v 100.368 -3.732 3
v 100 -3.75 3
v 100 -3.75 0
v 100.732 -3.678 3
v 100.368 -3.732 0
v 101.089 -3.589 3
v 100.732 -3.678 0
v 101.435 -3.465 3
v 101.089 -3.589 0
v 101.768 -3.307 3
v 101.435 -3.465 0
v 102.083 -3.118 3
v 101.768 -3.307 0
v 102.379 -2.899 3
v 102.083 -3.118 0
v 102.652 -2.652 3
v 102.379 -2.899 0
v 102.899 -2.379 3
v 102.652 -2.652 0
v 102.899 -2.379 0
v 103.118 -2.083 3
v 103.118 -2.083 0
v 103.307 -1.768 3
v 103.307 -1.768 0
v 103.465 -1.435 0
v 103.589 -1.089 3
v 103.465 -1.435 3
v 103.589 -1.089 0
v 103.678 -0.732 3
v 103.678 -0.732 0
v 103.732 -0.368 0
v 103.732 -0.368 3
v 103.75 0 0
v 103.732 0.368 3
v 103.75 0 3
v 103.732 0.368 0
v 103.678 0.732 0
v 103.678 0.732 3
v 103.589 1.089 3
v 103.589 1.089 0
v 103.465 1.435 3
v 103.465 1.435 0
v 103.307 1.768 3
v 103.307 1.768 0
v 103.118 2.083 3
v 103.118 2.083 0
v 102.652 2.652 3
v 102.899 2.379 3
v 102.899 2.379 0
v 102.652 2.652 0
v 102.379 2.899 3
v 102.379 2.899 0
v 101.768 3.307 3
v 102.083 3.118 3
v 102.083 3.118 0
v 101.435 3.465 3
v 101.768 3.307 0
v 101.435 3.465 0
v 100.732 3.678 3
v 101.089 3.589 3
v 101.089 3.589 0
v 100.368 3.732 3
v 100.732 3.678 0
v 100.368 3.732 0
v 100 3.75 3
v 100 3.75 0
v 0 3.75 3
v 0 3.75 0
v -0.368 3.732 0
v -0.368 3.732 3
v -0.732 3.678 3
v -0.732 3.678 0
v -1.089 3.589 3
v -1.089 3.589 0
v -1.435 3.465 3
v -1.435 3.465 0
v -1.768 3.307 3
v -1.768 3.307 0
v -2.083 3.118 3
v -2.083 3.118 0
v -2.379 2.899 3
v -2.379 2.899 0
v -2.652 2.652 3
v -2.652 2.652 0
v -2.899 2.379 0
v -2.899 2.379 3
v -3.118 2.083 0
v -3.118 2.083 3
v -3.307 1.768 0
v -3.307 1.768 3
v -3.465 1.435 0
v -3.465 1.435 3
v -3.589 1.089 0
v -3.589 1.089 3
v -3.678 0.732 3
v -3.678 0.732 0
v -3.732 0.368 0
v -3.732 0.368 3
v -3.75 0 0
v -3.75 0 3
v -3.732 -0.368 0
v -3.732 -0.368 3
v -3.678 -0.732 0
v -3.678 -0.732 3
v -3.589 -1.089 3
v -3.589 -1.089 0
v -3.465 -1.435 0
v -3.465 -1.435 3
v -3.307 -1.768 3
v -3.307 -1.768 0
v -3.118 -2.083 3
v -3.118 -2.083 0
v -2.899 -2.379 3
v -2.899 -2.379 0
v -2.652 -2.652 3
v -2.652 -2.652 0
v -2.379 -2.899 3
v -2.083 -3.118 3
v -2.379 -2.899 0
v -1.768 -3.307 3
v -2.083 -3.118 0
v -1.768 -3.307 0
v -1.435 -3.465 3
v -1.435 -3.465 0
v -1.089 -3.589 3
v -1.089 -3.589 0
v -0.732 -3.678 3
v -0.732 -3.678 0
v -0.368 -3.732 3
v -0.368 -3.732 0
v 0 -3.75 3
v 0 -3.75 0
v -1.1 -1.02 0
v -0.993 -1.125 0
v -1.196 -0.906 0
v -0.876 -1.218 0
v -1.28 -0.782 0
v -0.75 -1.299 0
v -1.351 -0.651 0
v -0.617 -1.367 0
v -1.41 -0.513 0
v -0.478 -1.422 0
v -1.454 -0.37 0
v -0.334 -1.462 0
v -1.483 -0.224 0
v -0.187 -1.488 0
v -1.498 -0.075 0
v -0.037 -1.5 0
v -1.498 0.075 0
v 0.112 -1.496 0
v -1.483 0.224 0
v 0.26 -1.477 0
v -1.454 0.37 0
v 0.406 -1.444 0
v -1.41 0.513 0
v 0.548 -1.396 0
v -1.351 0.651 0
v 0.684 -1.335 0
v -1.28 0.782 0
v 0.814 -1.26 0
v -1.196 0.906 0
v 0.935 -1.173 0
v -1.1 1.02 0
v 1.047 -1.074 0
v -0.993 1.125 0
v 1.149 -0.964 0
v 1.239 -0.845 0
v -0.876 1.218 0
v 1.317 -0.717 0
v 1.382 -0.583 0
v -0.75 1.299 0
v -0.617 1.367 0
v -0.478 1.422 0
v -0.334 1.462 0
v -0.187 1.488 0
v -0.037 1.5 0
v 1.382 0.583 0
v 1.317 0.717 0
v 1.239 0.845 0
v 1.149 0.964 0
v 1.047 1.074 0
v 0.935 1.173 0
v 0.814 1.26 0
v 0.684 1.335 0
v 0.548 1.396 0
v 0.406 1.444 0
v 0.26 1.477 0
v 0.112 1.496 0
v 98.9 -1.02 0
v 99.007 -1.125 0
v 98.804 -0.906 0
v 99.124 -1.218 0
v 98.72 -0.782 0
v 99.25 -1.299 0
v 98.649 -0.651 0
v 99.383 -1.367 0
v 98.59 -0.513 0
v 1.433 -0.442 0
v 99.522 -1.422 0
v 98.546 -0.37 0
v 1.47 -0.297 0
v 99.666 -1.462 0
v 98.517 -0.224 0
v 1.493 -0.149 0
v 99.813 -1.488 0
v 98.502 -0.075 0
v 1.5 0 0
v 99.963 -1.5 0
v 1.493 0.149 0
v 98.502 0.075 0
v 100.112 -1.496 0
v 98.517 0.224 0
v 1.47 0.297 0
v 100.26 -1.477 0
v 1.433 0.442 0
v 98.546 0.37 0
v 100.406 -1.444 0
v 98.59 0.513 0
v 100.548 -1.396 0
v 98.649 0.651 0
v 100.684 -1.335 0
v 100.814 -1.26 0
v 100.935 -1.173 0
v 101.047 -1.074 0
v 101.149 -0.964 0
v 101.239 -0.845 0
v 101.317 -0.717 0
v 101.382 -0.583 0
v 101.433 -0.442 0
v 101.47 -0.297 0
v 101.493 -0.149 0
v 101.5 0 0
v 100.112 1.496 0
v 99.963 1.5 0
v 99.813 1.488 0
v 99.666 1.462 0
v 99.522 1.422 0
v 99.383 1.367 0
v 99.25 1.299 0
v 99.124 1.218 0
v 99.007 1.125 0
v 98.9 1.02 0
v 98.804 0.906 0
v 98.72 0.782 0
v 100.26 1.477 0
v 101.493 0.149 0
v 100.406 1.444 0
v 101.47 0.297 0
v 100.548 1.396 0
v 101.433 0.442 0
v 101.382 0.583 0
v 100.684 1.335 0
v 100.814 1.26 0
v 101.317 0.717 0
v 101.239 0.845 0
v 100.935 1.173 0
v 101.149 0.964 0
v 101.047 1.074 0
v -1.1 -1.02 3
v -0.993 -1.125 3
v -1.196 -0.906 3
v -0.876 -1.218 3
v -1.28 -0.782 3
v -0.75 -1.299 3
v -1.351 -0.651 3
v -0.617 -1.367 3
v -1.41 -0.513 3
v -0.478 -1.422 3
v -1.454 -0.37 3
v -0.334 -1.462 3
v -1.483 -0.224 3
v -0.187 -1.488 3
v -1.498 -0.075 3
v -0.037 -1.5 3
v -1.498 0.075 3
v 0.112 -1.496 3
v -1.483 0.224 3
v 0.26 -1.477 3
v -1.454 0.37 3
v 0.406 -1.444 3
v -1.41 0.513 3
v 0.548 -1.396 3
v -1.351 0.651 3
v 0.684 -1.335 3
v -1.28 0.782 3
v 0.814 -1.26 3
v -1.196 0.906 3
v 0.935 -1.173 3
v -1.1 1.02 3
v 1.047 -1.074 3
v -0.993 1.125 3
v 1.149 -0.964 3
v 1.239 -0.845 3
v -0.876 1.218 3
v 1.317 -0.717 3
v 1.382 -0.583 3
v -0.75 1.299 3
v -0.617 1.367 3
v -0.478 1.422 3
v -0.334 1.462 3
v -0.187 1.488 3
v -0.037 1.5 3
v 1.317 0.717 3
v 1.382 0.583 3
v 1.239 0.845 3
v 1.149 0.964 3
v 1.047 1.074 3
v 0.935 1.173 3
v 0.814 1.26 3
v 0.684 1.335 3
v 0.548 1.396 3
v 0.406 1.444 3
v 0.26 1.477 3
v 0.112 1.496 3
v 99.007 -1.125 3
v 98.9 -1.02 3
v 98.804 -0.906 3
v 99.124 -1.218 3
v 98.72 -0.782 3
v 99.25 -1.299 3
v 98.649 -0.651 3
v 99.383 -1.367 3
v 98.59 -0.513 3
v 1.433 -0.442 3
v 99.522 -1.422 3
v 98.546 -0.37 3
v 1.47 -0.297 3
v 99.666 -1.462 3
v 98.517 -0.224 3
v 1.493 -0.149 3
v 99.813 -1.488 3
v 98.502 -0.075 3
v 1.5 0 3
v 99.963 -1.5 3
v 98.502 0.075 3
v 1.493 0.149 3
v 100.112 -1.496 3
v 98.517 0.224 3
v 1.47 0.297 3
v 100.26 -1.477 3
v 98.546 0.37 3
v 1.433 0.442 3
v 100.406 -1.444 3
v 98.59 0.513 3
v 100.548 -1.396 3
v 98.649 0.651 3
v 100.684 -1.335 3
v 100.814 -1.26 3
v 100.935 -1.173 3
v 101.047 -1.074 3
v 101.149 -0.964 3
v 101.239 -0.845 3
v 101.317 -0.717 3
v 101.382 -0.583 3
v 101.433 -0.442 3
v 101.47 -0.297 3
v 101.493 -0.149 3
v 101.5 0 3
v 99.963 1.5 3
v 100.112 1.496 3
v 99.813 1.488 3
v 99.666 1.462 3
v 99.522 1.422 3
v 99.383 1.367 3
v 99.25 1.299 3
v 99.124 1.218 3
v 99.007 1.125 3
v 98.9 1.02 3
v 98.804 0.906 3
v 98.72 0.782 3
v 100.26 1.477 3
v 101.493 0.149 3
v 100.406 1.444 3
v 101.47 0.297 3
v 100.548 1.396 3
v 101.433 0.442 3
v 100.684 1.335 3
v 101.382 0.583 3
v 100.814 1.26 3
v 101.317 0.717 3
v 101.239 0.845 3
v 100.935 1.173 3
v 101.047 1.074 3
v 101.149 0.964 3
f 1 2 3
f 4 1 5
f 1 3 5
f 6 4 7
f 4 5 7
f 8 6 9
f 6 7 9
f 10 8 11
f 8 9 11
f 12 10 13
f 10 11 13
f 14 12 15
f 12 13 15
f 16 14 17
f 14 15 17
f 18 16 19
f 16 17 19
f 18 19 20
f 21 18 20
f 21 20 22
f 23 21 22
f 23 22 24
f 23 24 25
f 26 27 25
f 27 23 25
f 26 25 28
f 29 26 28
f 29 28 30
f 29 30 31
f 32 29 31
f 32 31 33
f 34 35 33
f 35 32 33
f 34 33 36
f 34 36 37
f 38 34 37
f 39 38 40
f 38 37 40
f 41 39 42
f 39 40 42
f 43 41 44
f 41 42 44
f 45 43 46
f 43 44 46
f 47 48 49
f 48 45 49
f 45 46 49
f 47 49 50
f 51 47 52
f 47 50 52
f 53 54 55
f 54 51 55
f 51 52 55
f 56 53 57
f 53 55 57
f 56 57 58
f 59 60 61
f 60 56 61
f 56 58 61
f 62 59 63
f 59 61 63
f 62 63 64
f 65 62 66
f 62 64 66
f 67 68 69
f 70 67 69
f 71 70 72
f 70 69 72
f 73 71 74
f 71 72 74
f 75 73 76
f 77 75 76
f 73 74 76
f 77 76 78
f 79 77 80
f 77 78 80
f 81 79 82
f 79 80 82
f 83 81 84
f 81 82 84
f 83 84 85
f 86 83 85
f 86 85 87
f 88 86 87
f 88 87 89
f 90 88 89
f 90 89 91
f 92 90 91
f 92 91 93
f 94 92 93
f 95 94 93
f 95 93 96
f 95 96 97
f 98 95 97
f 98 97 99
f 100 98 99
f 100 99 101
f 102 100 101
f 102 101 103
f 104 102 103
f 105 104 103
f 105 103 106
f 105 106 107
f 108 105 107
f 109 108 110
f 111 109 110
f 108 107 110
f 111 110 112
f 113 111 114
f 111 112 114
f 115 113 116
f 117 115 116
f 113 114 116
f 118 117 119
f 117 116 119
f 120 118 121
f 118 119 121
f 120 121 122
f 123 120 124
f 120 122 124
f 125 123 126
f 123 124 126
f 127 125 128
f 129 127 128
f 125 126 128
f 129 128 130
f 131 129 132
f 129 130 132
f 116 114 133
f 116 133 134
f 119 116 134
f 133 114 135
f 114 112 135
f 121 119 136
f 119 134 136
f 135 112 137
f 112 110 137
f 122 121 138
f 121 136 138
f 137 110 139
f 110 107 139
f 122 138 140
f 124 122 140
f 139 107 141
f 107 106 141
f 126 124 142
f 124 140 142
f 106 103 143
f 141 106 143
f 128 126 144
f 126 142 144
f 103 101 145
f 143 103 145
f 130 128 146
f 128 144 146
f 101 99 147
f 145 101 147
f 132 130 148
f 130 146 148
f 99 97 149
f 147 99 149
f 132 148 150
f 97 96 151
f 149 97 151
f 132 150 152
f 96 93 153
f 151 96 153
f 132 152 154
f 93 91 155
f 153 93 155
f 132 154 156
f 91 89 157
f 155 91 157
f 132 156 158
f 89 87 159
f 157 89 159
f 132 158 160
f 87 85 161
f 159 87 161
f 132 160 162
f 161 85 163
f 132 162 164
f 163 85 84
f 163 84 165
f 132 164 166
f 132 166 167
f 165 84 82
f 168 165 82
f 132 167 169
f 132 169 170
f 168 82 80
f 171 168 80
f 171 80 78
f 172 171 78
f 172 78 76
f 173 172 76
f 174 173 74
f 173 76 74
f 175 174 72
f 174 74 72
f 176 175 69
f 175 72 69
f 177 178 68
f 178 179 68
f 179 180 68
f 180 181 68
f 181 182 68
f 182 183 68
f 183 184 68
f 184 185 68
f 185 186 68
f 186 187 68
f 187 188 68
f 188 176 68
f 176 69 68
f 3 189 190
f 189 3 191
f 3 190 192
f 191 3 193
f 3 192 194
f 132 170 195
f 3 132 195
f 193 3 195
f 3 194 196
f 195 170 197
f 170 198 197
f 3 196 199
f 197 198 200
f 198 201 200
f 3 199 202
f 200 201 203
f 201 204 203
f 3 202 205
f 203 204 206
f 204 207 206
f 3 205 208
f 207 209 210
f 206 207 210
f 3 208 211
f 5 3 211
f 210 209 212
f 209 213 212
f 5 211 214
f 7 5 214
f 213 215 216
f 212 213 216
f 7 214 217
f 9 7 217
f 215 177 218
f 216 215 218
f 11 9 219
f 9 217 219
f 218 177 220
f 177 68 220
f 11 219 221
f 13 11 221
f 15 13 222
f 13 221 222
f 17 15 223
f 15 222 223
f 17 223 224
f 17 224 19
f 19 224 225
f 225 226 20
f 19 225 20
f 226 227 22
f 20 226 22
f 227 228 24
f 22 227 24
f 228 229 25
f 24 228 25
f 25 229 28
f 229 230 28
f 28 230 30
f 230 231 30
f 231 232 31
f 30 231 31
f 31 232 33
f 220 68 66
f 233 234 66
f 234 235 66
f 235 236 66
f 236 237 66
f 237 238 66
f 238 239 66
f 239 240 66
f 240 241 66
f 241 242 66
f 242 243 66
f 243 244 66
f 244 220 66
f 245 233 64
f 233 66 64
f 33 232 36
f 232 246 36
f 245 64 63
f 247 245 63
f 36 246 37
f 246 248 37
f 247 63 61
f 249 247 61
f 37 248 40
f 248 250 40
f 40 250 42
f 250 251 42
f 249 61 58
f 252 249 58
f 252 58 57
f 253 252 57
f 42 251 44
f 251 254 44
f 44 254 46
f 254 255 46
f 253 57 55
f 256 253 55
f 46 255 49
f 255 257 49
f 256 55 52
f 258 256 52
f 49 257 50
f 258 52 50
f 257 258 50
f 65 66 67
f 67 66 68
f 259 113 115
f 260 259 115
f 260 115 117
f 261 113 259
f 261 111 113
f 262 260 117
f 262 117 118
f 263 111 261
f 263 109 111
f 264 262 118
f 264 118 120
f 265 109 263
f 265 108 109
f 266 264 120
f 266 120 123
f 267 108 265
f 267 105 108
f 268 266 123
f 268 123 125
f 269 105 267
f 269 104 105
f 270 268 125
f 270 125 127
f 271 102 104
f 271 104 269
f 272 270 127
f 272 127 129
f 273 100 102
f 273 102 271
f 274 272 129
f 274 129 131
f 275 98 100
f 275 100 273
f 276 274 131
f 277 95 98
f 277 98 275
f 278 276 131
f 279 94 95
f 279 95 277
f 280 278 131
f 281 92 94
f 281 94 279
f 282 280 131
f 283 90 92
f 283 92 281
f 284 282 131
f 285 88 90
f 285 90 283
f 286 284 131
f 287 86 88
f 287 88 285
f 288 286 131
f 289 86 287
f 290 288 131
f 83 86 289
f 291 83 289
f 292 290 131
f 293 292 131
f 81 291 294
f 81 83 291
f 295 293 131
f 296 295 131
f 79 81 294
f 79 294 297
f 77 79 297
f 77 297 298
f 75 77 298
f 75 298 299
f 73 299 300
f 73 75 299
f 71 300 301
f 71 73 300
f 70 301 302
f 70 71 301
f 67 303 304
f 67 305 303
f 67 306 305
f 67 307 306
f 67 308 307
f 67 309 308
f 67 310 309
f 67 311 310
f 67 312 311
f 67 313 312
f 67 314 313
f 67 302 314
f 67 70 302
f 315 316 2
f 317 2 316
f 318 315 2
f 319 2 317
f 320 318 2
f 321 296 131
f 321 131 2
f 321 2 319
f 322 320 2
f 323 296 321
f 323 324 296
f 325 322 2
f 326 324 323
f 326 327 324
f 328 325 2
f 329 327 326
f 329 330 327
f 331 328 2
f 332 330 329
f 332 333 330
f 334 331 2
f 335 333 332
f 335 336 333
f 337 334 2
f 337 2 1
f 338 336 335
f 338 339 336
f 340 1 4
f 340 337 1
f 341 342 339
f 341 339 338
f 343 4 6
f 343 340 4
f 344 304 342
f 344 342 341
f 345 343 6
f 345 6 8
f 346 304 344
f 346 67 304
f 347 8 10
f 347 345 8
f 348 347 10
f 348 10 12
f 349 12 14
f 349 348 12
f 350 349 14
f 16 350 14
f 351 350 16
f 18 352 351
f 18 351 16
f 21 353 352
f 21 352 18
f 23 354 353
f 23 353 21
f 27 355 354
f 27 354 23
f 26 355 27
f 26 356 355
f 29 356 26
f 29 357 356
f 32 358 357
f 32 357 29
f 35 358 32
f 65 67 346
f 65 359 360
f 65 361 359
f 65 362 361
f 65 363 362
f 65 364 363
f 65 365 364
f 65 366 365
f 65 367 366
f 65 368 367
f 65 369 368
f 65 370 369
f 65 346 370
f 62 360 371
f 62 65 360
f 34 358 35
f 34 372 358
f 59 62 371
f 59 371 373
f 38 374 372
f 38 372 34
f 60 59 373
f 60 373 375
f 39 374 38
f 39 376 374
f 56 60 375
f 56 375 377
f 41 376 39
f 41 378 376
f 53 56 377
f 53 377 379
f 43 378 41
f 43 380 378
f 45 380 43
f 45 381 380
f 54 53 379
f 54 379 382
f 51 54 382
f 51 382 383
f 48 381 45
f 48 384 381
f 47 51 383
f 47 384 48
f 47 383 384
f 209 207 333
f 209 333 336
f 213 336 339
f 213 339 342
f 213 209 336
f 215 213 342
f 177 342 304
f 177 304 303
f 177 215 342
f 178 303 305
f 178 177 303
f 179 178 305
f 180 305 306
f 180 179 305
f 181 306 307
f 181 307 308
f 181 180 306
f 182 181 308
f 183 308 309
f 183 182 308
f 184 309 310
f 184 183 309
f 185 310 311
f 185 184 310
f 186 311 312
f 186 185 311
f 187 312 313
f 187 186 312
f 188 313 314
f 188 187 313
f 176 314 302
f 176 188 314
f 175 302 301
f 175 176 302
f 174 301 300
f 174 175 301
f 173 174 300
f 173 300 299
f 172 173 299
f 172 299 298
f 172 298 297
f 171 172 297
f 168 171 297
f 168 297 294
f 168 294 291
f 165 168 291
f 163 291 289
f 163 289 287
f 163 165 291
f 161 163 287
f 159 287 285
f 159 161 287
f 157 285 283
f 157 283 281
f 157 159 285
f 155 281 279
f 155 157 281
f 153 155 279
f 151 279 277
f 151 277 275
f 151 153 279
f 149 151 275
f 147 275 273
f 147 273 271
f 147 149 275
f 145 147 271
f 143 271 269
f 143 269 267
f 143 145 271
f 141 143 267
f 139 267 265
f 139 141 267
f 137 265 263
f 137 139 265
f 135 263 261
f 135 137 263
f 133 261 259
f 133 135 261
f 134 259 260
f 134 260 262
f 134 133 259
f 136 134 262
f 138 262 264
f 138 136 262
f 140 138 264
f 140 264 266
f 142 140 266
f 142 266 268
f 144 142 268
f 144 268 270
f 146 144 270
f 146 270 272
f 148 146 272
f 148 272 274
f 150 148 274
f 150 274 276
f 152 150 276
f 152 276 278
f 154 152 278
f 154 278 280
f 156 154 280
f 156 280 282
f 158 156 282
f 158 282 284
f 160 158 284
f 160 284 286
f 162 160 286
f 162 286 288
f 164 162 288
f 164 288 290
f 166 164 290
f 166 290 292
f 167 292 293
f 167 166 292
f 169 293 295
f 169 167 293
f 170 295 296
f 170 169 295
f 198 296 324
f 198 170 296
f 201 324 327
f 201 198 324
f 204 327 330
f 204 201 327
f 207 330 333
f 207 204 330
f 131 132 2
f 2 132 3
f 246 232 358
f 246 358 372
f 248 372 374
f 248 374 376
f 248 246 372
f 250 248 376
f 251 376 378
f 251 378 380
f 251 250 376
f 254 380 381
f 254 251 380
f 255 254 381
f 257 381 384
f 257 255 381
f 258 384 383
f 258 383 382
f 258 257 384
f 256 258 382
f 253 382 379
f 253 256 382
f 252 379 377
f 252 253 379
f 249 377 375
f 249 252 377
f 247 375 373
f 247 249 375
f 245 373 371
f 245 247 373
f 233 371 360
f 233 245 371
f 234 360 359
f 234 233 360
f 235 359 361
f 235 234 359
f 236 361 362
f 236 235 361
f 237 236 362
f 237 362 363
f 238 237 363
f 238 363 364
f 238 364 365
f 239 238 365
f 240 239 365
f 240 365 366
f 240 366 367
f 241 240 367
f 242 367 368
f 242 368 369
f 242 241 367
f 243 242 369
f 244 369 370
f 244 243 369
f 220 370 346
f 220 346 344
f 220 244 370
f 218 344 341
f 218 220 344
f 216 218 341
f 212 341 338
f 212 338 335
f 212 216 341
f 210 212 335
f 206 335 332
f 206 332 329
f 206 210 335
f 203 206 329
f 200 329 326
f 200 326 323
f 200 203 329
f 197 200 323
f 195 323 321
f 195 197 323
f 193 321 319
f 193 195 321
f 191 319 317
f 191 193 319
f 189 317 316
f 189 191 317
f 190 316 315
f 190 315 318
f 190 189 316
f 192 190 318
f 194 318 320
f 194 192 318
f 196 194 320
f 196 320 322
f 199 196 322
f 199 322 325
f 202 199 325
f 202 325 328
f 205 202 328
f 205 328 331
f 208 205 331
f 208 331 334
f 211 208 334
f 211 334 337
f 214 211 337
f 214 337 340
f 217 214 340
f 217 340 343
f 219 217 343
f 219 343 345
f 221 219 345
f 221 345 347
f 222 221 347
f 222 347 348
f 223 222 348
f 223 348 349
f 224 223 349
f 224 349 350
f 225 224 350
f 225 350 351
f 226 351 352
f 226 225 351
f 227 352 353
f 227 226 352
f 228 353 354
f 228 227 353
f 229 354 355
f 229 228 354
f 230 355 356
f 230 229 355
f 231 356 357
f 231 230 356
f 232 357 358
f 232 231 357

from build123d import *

# Parameters (mm, degrees)
SKETCH2_R           = 3.75
SKETCH2_R_2         = 1.5
BOSS_EXTRUDE1_DEPTH = 3


with BuildPart() as part:
    # Sketch2 → Boss-Extrude1 (new body)
    # profile 1 of 3: a face of its own
    with BuildSketch(Plane.XY):
        Circle(SKETCH2_R)
        Circle(SKETCH2_R_2, mode=Mode.SUBTRACT)
    # profile 2 of 3: a face of its own
    with BuildSketch(Plane.XY):
        with BuildLine():
            ThreePointArc((3.75, 0), (2.651650429, -2.651650429), (0, -3.75))
            Line((0, -3.75), (100, -3.75))
            ThreePointArc((100, -3.75), (96.25, 0), (100, 3.75))
            Line((100, 3.75), (0, 3.75))
            ThreePointArc((0, 3.75), (2.651650429, 2.651650429), (3.75, 0))
        make_face()
    # profile 3 of 3: a face of its own
    with BuildSketch(Plane.XY):
        with Locations((100, 0)):
            Circle(SKETCH2_R)
        with Locations((100, 0)):
            Circle(SKETCH2_R_2, mode=Mode.SUBTRACT)
    extrude(amount=BOSS_EXTRUDE1_DEPTH)


solid = part.part
